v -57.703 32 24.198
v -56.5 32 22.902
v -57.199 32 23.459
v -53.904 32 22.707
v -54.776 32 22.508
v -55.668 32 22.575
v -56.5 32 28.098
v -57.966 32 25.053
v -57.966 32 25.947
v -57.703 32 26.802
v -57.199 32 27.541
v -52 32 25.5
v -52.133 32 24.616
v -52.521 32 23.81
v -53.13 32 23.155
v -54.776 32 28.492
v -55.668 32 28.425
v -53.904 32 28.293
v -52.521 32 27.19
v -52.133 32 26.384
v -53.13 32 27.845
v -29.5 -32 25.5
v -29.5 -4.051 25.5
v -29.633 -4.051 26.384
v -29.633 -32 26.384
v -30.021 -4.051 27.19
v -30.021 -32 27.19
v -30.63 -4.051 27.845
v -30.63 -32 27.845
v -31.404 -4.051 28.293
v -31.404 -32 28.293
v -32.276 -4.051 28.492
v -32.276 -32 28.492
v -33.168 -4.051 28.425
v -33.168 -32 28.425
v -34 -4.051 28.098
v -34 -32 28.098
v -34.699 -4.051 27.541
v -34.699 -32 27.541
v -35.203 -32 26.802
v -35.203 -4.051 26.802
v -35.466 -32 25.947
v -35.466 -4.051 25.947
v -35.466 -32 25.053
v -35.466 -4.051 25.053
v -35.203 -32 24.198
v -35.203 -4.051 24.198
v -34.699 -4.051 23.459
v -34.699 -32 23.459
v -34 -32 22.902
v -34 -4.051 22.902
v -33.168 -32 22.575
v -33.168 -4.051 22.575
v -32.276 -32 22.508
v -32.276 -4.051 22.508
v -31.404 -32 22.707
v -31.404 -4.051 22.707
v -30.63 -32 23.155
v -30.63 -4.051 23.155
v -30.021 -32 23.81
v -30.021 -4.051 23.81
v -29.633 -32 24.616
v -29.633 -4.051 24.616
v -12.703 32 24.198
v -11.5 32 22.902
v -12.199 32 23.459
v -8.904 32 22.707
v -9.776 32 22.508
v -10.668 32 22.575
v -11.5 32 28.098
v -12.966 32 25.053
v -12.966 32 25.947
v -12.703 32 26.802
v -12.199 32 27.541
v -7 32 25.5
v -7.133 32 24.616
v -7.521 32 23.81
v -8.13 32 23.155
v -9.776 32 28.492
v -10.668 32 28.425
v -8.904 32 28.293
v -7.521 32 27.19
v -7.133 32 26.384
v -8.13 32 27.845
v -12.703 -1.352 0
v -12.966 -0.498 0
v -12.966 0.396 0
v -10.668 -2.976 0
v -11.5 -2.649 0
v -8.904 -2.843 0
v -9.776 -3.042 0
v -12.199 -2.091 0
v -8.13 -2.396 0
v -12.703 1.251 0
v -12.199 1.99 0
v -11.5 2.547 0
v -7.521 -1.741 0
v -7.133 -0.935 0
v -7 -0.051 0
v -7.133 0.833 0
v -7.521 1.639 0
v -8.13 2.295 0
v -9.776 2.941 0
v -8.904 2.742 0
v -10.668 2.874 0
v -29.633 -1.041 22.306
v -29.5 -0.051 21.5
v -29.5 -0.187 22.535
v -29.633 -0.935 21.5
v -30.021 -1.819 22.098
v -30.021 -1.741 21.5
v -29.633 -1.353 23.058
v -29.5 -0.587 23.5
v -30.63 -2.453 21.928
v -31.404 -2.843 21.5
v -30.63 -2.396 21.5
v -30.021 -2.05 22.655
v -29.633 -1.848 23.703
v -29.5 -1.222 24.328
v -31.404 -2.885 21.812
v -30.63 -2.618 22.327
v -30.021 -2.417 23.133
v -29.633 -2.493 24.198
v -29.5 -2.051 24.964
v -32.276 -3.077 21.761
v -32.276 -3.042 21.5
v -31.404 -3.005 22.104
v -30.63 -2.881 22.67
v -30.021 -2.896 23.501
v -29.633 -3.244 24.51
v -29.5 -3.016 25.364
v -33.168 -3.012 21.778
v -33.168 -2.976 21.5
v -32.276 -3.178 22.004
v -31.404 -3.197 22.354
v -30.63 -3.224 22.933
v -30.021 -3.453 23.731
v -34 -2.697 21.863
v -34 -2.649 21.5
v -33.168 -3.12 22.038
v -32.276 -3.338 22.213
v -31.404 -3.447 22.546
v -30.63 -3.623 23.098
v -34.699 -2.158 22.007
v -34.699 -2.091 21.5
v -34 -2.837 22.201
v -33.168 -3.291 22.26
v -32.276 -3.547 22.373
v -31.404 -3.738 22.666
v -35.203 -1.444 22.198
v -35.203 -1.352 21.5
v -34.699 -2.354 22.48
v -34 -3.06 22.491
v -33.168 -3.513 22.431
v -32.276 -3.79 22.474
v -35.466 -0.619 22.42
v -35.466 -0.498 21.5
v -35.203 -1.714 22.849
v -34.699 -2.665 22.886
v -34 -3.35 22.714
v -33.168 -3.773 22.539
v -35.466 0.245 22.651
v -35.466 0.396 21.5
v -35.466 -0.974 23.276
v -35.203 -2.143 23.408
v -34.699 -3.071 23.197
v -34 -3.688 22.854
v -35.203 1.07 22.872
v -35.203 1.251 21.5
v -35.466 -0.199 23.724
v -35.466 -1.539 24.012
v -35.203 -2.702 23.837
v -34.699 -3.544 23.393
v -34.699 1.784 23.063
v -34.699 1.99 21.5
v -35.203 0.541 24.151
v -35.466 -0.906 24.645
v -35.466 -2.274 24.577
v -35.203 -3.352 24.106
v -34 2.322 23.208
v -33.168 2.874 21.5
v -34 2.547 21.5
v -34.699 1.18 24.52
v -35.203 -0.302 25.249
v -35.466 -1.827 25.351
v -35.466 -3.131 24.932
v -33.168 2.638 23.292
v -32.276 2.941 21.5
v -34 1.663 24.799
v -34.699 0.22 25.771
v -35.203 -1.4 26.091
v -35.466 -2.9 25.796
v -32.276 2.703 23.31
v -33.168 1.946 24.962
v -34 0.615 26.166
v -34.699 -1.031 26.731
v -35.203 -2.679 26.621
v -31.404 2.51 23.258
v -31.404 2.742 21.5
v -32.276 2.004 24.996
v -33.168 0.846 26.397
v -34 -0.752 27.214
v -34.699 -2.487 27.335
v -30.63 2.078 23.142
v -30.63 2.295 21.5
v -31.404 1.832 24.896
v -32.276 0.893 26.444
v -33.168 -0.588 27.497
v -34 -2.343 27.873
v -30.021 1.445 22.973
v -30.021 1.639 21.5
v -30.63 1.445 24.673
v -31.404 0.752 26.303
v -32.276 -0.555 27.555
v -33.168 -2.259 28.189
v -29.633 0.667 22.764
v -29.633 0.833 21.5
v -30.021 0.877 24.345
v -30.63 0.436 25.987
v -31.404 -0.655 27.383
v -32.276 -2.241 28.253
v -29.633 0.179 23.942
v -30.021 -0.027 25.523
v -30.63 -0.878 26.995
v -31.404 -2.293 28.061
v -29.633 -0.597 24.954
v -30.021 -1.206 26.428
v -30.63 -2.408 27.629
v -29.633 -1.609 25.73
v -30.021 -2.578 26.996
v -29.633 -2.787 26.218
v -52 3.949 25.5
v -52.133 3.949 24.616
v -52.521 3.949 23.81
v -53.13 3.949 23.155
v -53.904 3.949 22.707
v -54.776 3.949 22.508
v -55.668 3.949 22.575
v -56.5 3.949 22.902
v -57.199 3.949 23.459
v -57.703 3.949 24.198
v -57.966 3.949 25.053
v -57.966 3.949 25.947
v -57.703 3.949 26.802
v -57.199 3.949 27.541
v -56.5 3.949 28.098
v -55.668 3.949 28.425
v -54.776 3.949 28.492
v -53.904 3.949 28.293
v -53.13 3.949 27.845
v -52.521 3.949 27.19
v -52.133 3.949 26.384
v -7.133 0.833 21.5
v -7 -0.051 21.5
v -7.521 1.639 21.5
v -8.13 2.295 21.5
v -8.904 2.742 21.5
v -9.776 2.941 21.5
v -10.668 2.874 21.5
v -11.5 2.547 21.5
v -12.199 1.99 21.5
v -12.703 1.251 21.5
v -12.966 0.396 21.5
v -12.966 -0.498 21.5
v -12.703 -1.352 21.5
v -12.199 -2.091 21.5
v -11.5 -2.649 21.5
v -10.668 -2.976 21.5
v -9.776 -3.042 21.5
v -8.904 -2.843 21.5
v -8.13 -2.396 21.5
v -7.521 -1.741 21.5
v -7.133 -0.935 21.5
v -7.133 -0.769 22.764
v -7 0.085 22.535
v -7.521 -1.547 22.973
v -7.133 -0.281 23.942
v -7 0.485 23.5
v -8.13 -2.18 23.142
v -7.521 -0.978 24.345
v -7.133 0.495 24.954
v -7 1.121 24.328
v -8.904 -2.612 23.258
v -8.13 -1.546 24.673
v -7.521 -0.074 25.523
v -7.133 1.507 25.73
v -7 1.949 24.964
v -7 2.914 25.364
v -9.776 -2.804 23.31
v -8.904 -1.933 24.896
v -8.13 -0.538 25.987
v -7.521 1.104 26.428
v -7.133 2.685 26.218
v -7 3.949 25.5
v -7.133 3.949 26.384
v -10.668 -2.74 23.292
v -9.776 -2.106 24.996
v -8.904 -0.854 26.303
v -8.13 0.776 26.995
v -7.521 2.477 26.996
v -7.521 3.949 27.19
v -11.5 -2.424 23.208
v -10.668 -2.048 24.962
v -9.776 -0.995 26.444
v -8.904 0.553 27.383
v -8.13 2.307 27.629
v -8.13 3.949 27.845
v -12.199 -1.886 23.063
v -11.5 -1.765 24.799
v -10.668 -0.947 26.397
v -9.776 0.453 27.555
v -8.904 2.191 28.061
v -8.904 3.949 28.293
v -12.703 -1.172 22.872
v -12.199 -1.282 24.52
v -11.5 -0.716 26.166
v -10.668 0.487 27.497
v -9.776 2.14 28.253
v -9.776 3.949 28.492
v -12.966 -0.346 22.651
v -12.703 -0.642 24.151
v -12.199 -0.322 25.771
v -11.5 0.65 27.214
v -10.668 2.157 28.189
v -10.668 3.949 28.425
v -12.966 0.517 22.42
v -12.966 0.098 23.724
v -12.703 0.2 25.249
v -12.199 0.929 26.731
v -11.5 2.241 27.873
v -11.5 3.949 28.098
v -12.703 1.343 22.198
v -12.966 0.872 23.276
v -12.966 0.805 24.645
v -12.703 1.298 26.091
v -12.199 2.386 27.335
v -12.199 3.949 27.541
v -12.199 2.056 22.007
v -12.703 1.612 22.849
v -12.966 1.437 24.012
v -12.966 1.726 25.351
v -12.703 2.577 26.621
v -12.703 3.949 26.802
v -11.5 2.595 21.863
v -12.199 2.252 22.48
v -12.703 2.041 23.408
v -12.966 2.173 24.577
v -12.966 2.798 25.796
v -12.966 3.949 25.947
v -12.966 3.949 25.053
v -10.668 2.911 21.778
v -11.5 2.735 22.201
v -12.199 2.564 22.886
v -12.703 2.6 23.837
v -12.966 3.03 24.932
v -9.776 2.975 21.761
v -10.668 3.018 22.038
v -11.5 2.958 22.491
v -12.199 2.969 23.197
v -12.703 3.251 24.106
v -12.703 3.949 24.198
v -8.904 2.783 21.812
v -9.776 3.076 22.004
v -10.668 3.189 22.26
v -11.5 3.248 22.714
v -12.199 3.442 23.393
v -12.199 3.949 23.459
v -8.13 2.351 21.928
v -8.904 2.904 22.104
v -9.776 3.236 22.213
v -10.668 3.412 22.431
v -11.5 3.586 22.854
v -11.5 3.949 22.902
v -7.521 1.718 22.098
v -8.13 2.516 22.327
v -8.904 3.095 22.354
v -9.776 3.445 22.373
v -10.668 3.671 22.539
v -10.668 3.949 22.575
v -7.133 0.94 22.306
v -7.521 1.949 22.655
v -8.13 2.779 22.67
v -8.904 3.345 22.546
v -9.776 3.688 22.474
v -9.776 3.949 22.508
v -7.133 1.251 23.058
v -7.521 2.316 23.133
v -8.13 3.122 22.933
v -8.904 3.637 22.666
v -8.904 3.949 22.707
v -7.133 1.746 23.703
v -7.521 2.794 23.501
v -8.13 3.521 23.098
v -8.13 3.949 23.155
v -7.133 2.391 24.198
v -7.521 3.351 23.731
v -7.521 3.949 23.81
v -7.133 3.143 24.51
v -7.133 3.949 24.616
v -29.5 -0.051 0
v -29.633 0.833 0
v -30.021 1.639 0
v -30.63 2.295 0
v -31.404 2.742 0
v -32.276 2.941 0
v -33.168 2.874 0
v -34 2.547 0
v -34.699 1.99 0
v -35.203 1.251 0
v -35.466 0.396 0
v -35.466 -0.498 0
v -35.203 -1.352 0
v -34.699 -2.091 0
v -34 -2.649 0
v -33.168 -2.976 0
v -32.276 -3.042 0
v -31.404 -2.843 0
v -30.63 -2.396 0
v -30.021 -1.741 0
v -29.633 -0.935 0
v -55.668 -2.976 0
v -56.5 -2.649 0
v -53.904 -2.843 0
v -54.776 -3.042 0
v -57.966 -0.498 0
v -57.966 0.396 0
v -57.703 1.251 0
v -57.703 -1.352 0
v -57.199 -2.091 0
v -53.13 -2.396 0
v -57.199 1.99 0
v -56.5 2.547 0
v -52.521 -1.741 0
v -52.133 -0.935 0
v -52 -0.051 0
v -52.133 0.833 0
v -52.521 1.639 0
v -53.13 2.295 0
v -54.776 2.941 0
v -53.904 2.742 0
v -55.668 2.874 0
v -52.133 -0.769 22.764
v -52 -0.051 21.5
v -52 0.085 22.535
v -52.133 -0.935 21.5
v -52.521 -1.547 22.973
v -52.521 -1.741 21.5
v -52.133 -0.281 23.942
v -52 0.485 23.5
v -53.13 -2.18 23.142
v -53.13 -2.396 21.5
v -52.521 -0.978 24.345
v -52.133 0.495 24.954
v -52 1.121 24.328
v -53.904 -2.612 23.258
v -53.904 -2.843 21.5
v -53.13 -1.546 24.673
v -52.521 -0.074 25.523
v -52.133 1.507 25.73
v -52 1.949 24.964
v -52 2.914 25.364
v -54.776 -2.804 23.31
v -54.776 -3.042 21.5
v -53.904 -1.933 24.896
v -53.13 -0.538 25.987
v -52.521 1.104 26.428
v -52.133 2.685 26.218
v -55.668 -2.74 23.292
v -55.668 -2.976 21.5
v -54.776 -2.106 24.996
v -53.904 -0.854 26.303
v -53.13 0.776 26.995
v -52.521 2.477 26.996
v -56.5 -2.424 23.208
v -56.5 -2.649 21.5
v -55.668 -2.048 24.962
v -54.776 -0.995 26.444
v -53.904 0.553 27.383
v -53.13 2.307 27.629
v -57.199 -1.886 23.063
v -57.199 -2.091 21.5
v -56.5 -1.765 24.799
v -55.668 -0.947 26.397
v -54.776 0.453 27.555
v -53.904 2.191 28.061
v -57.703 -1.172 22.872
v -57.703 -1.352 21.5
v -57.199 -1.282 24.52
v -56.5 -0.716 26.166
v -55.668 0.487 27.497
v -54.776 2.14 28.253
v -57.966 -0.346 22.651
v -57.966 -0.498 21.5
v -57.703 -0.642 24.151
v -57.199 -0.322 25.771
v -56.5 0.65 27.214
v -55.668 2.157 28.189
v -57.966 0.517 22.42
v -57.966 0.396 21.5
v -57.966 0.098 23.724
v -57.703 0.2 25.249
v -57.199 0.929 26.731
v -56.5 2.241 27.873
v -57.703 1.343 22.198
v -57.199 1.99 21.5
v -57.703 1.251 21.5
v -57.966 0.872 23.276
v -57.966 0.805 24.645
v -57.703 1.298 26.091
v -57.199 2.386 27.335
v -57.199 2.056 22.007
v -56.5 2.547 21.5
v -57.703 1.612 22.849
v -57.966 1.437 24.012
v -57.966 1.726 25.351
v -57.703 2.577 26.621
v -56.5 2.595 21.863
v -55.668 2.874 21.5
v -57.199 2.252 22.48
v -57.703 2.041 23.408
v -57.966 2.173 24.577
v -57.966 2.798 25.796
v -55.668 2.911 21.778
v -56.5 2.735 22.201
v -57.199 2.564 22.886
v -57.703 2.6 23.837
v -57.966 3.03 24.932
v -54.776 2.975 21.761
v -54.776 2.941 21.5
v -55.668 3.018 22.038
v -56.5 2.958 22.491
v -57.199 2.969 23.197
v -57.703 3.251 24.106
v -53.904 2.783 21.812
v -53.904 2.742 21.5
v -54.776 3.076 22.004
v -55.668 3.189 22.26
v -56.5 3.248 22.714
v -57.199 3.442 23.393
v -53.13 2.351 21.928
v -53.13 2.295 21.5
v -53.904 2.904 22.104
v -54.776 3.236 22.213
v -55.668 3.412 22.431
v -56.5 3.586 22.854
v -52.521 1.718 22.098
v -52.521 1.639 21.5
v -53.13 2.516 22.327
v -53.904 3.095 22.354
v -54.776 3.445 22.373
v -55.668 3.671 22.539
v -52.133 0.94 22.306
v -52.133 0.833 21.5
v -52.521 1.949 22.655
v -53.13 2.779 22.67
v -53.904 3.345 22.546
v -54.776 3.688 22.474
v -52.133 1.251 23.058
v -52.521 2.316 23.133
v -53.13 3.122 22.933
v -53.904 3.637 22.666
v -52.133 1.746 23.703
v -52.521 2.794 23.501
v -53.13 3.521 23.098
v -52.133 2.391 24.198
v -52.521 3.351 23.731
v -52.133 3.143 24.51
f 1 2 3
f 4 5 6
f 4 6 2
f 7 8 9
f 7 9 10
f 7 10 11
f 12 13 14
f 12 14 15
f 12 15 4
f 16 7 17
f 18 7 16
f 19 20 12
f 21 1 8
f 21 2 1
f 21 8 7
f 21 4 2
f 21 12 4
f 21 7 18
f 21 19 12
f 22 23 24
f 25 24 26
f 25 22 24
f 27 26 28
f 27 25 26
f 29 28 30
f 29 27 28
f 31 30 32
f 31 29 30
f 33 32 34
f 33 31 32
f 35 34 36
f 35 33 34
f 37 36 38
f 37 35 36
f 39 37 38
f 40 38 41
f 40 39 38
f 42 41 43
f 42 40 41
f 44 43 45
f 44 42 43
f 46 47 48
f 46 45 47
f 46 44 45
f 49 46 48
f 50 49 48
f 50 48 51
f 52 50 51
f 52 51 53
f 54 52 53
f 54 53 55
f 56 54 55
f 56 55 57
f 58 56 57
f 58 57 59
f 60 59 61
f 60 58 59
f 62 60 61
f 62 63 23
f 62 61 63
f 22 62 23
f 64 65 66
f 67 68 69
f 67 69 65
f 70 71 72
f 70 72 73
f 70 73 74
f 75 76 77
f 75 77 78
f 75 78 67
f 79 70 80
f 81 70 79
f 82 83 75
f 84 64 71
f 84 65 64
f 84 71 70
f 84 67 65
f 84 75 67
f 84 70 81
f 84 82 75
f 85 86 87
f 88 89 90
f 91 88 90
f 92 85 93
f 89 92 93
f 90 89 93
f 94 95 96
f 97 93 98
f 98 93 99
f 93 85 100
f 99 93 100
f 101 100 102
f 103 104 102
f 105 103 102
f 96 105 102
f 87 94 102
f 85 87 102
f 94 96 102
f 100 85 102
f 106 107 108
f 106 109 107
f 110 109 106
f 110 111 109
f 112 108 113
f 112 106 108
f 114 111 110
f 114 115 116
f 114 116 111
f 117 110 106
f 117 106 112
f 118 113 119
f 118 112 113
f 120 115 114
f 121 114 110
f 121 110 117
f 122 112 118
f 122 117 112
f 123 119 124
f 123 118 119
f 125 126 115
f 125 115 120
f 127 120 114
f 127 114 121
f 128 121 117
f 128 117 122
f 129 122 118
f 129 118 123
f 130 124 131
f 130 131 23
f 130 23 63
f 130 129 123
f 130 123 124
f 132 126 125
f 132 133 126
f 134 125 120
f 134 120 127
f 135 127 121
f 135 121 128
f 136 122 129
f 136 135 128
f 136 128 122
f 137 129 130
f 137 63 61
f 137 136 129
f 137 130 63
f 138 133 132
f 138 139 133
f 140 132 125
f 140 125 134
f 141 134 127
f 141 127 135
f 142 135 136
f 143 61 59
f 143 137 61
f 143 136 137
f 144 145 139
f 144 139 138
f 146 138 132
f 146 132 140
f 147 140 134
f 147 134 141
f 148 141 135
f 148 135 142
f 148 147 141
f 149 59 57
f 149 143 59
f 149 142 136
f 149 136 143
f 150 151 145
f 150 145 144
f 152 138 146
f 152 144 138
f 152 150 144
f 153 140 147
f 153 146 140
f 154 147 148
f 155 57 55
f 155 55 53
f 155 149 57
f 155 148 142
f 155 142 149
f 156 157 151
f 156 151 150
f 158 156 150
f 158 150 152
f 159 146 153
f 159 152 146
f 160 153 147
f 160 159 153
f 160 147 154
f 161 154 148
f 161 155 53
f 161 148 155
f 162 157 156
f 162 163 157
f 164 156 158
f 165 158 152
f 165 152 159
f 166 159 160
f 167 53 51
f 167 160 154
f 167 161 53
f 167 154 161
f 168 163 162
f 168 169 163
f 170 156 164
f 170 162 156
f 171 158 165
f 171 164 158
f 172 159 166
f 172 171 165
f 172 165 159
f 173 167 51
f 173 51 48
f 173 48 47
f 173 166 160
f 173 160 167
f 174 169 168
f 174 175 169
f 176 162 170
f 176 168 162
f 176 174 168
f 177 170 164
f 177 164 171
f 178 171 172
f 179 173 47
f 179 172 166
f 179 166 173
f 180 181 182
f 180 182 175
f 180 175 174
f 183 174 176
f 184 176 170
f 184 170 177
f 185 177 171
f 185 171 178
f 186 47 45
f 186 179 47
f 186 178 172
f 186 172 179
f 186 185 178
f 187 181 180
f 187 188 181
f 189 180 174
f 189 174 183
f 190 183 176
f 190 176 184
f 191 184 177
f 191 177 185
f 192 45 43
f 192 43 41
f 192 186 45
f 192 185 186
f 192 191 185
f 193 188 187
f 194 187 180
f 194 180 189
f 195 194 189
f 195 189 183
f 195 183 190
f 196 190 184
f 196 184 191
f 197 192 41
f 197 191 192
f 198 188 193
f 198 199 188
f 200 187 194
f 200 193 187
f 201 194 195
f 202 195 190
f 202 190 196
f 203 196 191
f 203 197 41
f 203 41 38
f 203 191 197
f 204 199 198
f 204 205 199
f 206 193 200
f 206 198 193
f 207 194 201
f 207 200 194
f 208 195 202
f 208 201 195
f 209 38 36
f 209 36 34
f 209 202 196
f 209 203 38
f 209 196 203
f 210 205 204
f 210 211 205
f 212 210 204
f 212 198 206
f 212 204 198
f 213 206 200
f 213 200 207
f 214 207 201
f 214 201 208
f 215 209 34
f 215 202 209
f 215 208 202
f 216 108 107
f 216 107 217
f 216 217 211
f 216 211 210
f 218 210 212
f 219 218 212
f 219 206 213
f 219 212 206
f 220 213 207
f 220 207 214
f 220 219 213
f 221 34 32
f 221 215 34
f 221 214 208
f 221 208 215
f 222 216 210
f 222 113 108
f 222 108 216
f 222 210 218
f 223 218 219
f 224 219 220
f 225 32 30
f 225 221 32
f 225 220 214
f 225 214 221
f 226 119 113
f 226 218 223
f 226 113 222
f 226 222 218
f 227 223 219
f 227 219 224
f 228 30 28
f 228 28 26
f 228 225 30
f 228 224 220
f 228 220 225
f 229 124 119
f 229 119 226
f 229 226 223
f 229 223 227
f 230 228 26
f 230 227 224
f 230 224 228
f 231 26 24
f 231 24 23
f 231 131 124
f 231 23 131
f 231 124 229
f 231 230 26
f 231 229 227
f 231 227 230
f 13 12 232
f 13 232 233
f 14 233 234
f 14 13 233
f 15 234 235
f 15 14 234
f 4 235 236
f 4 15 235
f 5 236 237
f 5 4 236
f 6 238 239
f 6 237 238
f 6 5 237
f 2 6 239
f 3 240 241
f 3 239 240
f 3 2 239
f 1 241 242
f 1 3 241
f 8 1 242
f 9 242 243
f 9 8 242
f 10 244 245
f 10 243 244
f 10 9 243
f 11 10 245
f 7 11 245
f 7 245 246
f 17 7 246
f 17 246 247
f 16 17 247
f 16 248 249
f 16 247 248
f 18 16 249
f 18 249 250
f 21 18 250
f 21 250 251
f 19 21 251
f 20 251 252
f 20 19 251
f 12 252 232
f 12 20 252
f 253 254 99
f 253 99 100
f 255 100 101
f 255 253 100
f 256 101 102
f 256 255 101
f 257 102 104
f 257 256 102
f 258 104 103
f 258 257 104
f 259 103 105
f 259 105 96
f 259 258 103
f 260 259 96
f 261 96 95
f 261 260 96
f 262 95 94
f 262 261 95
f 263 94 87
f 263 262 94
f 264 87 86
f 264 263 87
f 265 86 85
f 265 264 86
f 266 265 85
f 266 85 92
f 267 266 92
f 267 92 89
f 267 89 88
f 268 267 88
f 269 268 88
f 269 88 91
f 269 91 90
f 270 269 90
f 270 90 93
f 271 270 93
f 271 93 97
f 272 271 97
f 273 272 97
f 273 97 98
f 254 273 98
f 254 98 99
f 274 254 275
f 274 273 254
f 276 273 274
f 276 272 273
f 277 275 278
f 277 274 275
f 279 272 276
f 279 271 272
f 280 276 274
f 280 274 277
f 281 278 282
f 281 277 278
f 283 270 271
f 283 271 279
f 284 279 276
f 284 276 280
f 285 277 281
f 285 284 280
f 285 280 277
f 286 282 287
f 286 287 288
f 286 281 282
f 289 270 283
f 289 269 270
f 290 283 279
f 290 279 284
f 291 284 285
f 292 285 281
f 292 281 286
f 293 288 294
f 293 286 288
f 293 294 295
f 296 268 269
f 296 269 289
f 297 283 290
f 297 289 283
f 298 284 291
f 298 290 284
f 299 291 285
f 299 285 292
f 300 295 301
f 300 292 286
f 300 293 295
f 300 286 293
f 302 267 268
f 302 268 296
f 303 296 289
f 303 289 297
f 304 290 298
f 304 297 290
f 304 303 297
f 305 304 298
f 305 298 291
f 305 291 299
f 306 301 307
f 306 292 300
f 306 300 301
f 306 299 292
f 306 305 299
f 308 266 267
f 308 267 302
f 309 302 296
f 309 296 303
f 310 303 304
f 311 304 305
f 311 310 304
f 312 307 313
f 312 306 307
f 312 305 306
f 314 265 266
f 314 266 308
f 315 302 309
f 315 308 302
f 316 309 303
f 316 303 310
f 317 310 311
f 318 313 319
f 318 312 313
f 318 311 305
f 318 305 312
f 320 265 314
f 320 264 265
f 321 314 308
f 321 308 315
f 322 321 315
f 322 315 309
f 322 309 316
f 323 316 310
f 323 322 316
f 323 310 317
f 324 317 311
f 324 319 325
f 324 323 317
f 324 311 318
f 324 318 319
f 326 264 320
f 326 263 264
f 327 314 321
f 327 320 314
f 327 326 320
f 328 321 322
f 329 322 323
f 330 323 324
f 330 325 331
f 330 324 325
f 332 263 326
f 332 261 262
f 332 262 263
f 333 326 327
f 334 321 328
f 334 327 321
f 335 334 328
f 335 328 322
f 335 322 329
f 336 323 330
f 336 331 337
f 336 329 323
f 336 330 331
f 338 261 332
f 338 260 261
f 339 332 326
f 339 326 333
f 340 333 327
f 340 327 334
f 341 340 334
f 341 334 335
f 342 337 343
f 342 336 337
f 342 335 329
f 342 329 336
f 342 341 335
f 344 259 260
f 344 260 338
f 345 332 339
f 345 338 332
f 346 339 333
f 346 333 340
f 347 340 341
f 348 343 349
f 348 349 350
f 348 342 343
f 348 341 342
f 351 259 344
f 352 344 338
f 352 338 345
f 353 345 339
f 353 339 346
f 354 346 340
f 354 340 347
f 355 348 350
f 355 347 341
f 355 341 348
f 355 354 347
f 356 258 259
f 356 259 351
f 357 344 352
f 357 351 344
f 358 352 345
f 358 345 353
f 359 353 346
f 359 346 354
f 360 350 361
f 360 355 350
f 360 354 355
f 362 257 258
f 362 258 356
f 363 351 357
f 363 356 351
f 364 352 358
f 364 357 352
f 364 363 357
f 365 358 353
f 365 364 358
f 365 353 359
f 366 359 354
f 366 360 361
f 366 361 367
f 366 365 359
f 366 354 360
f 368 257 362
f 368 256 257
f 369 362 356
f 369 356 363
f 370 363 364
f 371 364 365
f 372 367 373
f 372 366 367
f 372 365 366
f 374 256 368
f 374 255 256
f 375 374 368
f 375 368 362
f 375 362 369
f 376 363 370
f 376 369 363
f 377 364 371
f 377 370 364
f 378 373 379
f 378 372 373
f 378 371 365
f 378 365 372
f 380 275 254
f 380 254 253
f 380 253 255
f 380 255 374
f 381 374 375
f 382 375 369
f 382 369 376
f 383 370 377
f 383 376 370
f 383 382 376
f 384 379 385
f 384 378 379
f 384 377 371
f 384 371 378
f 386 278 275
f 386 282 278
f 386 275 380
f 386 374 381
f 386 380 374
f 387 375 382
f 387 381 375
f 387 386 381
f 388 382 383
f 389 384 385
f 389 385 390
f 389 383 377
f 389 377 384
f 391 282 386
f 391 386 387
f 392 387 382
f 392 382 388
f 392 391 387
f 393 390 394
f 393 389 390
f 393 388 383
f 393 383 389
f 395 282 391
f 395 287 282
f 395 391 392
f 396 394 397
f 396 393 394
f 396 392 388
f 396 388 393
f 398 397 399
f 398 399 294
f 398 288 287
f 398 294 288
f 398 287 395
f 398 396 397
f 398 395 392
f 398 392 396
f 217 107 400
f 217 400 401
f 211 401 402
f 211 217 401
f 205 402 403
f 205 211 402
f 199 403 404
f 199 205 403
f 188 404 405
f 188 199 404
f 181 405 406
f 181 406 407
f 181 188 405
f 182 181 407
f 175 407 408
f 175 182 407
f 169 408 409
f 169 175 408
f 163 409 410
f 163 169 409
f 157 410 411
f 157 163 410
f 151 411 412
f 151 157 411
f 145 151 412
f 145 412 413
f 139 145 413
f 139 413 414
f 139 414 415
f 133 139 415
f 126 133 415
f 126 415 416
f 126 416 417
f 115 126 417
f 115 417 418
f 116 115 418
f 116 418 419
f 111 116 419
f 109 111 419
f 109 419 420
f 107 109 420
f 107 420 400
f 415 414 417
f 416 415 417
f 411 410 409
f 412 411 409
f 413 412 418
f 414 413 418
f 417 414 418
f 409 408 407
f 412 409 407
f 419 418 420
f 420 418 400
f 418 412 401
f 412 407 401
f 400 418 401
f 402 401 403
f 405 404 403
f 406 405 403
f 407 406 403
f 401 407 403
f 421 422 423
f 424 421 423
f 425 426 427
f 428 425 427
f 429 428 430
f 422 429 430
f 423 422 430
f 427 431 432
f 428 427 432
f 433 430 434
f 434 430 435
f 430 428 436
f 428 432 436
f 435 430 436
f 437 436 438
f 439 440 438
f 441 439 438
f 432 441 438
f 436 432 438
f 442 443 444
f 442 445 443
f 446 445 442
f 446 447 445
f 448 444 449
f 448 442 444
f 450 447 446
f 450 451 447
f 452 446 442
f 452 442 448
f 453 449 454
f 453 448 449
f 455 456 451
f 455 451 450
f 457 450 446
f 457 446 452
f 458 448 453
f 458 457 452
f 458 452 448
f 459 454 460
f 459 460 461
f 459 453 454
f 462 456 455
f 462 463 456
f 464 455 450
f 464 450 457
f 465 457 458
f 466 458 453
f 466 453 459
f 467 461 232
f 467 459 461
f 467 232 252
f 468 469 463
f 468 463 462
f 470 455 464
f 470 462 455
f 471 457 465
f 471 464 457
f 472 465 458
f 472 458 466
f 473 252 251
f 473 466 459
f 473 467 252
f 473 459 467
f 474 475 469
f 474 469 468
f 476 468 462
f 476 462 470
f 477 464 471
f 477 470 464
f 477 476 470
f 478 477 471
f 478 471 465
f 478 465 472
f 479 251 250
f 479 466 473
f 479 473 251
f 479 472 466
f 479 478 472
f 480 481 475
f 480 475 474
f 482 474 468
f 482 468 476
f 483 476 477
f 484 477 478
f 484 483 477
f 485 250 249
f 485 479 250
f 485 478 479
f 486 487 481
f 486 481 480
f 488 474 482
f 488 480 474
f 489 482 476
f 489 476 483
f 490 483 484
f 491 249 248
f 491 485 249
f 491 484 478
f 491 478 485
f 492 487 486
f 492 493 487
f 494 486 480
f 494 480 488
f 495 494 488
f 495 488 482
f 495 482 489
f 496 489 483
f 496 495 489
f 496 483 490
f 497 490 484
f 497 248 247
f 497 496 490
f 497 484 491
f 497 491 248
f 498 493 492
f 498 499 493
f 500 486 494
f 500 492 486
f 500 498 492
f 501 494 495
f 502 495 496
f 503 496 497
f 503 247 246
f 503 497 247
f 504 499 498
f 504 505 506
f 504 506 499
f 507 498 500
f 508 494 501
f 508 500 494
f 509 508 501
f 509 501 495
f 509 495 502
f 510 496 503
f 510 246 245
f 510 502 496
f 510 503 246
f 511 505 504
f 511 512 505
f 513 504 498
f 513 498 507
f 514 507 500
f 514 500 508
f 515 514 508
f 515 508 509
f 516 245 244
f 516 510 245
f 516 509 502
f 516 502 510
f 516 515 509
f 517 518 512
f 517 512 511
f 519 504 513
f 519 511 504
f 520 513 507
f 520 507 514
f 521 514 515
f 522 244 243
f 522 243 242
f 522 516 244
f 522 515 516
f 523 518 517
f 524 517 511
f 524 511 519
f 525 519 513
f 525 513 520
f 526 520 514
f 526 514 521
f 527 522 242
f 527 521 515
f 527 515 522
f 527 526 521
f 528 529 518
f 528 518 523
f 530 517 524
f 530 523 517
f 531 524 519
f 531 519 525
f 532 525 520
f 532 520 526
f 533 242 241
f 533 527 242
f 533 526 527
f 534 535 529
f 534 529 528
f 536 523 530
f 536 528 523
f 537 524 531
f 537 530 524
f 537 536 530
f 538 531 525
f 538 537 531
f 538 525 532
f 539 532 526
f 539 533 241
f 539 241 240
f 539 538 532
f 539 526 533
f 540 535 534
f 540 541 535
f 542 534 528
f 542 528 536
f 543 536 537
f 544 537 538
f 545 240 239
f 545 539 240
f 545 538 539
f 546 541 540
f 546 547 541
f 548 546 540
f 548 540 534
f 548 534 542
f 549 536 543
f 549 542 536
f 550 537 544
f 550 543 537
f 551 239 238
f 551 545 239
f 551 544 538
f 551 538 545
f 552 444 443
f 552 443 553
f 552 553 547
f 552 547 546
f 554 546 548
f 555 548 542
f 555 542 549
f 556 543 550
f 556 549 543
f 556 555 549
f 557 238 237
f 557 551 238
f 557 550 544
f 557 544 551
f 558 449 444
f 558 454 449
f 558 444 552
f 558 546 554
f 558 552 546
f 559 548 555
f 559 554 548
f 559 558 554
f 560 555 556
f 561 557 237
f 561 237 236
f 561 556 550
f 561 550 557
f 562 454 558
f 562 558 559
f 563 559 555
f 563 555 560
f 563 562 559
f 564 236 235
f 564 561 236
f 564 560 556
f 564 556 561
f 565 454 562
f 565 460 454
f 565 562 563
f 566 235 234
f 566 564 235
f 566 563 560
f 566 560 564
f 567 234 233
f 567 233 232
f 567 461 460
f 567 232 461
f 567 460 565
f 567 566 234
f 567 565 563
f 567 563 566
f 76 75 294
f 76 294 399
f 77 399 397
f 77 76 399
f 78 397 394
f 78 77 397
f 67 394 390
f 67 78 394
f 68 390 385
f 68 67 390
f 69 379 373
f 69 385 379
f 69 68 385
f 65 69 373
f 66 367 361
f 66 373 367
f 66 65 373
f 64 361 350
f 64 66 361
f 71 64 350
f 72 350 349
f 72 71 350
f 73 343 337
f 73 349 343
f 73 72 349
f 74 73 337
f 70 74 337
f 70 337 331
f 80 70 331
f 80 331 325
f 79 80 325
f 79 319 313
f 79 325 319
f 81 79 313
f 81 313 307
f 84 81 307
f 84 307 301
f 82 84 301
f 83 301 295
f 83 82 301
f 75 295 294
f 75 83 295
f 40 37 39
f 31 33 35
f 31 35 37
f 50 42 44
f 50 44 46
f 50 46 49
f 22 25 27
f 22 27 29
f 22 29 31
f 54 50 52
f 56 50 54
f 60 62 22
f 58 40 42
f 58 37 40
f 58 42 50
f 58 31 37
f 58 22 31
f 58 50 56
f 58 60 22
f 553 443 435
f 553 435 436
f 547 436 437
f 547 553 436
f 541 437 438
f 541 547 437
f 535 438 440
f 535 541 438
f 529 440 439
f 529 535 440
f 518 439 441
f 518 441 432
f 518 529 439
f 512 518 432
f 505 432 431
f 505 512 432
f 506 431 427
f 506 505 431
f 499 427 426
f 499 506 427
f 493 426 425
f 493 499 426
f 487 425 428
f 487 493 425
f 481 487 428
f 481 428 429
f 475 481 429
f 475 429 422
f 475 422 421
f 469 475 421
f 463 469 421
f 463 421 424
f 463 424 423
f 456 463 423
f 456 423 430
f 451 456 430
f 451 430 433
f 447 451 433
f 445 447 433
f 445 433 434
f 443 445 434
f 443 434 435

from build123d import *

# Parameters (mm, degrees)
SCHIZZO3_R = 3
SCHIZZO5_R = 3


with BuildPart() as part:
    # Sweep1: sweep along a path in Schizzo2
    with BuildLine(Plane(origin=(-55, -0.050815836, 0), x_dir=(0, 0, 1), z_dir=(-1, 0, 0))) as sweep1_path:
        Line((0, 0), (21.5, 0))
        ThreePointArc((21.5, 0), (24.328427125, 1.171572875), (25.5, 4))
        Line((25.5, 4), (25.5, 32.050815836))
    # Schizzo3 → Sweep1 (sweep)
    with BuildSketch(Plane.XY):
        with Locations((-55, -0.050815836)):
            Circle(SCHIZZO3_R)
        with Locations((-10, -0.050815836)):
            Circle(SCHIZZO3_R)
    sweep(path=sweep1_path.line)


with BuildPart() as body_2:
    # Sweep2: sweep along a path in Schizzo4
    with BuildLine(Plane(origin=(-32.5, -0.050815836, 0), x_dir=(0, 0, 1), z_dir=(-1, 0, 0))) as sweep2_path:
        Line((0, 0), (21.5, 0))
        ThreePointArc((21.5, 0), (24.328427125, -1.171572875), (25.5, -4))
        Line((25.5, -4), (25.5, -31.949184164))
    # Schizzo5 → Sweep2 (sweep)
    with BuildSketch(Plane.XY):
        with Locations((-32.5, -0.050815836)):
            Circle(SCHIZZO5_R)
    sweep(path=sweep2_path.line)


solid = Compound([part.part, body_2.part])
